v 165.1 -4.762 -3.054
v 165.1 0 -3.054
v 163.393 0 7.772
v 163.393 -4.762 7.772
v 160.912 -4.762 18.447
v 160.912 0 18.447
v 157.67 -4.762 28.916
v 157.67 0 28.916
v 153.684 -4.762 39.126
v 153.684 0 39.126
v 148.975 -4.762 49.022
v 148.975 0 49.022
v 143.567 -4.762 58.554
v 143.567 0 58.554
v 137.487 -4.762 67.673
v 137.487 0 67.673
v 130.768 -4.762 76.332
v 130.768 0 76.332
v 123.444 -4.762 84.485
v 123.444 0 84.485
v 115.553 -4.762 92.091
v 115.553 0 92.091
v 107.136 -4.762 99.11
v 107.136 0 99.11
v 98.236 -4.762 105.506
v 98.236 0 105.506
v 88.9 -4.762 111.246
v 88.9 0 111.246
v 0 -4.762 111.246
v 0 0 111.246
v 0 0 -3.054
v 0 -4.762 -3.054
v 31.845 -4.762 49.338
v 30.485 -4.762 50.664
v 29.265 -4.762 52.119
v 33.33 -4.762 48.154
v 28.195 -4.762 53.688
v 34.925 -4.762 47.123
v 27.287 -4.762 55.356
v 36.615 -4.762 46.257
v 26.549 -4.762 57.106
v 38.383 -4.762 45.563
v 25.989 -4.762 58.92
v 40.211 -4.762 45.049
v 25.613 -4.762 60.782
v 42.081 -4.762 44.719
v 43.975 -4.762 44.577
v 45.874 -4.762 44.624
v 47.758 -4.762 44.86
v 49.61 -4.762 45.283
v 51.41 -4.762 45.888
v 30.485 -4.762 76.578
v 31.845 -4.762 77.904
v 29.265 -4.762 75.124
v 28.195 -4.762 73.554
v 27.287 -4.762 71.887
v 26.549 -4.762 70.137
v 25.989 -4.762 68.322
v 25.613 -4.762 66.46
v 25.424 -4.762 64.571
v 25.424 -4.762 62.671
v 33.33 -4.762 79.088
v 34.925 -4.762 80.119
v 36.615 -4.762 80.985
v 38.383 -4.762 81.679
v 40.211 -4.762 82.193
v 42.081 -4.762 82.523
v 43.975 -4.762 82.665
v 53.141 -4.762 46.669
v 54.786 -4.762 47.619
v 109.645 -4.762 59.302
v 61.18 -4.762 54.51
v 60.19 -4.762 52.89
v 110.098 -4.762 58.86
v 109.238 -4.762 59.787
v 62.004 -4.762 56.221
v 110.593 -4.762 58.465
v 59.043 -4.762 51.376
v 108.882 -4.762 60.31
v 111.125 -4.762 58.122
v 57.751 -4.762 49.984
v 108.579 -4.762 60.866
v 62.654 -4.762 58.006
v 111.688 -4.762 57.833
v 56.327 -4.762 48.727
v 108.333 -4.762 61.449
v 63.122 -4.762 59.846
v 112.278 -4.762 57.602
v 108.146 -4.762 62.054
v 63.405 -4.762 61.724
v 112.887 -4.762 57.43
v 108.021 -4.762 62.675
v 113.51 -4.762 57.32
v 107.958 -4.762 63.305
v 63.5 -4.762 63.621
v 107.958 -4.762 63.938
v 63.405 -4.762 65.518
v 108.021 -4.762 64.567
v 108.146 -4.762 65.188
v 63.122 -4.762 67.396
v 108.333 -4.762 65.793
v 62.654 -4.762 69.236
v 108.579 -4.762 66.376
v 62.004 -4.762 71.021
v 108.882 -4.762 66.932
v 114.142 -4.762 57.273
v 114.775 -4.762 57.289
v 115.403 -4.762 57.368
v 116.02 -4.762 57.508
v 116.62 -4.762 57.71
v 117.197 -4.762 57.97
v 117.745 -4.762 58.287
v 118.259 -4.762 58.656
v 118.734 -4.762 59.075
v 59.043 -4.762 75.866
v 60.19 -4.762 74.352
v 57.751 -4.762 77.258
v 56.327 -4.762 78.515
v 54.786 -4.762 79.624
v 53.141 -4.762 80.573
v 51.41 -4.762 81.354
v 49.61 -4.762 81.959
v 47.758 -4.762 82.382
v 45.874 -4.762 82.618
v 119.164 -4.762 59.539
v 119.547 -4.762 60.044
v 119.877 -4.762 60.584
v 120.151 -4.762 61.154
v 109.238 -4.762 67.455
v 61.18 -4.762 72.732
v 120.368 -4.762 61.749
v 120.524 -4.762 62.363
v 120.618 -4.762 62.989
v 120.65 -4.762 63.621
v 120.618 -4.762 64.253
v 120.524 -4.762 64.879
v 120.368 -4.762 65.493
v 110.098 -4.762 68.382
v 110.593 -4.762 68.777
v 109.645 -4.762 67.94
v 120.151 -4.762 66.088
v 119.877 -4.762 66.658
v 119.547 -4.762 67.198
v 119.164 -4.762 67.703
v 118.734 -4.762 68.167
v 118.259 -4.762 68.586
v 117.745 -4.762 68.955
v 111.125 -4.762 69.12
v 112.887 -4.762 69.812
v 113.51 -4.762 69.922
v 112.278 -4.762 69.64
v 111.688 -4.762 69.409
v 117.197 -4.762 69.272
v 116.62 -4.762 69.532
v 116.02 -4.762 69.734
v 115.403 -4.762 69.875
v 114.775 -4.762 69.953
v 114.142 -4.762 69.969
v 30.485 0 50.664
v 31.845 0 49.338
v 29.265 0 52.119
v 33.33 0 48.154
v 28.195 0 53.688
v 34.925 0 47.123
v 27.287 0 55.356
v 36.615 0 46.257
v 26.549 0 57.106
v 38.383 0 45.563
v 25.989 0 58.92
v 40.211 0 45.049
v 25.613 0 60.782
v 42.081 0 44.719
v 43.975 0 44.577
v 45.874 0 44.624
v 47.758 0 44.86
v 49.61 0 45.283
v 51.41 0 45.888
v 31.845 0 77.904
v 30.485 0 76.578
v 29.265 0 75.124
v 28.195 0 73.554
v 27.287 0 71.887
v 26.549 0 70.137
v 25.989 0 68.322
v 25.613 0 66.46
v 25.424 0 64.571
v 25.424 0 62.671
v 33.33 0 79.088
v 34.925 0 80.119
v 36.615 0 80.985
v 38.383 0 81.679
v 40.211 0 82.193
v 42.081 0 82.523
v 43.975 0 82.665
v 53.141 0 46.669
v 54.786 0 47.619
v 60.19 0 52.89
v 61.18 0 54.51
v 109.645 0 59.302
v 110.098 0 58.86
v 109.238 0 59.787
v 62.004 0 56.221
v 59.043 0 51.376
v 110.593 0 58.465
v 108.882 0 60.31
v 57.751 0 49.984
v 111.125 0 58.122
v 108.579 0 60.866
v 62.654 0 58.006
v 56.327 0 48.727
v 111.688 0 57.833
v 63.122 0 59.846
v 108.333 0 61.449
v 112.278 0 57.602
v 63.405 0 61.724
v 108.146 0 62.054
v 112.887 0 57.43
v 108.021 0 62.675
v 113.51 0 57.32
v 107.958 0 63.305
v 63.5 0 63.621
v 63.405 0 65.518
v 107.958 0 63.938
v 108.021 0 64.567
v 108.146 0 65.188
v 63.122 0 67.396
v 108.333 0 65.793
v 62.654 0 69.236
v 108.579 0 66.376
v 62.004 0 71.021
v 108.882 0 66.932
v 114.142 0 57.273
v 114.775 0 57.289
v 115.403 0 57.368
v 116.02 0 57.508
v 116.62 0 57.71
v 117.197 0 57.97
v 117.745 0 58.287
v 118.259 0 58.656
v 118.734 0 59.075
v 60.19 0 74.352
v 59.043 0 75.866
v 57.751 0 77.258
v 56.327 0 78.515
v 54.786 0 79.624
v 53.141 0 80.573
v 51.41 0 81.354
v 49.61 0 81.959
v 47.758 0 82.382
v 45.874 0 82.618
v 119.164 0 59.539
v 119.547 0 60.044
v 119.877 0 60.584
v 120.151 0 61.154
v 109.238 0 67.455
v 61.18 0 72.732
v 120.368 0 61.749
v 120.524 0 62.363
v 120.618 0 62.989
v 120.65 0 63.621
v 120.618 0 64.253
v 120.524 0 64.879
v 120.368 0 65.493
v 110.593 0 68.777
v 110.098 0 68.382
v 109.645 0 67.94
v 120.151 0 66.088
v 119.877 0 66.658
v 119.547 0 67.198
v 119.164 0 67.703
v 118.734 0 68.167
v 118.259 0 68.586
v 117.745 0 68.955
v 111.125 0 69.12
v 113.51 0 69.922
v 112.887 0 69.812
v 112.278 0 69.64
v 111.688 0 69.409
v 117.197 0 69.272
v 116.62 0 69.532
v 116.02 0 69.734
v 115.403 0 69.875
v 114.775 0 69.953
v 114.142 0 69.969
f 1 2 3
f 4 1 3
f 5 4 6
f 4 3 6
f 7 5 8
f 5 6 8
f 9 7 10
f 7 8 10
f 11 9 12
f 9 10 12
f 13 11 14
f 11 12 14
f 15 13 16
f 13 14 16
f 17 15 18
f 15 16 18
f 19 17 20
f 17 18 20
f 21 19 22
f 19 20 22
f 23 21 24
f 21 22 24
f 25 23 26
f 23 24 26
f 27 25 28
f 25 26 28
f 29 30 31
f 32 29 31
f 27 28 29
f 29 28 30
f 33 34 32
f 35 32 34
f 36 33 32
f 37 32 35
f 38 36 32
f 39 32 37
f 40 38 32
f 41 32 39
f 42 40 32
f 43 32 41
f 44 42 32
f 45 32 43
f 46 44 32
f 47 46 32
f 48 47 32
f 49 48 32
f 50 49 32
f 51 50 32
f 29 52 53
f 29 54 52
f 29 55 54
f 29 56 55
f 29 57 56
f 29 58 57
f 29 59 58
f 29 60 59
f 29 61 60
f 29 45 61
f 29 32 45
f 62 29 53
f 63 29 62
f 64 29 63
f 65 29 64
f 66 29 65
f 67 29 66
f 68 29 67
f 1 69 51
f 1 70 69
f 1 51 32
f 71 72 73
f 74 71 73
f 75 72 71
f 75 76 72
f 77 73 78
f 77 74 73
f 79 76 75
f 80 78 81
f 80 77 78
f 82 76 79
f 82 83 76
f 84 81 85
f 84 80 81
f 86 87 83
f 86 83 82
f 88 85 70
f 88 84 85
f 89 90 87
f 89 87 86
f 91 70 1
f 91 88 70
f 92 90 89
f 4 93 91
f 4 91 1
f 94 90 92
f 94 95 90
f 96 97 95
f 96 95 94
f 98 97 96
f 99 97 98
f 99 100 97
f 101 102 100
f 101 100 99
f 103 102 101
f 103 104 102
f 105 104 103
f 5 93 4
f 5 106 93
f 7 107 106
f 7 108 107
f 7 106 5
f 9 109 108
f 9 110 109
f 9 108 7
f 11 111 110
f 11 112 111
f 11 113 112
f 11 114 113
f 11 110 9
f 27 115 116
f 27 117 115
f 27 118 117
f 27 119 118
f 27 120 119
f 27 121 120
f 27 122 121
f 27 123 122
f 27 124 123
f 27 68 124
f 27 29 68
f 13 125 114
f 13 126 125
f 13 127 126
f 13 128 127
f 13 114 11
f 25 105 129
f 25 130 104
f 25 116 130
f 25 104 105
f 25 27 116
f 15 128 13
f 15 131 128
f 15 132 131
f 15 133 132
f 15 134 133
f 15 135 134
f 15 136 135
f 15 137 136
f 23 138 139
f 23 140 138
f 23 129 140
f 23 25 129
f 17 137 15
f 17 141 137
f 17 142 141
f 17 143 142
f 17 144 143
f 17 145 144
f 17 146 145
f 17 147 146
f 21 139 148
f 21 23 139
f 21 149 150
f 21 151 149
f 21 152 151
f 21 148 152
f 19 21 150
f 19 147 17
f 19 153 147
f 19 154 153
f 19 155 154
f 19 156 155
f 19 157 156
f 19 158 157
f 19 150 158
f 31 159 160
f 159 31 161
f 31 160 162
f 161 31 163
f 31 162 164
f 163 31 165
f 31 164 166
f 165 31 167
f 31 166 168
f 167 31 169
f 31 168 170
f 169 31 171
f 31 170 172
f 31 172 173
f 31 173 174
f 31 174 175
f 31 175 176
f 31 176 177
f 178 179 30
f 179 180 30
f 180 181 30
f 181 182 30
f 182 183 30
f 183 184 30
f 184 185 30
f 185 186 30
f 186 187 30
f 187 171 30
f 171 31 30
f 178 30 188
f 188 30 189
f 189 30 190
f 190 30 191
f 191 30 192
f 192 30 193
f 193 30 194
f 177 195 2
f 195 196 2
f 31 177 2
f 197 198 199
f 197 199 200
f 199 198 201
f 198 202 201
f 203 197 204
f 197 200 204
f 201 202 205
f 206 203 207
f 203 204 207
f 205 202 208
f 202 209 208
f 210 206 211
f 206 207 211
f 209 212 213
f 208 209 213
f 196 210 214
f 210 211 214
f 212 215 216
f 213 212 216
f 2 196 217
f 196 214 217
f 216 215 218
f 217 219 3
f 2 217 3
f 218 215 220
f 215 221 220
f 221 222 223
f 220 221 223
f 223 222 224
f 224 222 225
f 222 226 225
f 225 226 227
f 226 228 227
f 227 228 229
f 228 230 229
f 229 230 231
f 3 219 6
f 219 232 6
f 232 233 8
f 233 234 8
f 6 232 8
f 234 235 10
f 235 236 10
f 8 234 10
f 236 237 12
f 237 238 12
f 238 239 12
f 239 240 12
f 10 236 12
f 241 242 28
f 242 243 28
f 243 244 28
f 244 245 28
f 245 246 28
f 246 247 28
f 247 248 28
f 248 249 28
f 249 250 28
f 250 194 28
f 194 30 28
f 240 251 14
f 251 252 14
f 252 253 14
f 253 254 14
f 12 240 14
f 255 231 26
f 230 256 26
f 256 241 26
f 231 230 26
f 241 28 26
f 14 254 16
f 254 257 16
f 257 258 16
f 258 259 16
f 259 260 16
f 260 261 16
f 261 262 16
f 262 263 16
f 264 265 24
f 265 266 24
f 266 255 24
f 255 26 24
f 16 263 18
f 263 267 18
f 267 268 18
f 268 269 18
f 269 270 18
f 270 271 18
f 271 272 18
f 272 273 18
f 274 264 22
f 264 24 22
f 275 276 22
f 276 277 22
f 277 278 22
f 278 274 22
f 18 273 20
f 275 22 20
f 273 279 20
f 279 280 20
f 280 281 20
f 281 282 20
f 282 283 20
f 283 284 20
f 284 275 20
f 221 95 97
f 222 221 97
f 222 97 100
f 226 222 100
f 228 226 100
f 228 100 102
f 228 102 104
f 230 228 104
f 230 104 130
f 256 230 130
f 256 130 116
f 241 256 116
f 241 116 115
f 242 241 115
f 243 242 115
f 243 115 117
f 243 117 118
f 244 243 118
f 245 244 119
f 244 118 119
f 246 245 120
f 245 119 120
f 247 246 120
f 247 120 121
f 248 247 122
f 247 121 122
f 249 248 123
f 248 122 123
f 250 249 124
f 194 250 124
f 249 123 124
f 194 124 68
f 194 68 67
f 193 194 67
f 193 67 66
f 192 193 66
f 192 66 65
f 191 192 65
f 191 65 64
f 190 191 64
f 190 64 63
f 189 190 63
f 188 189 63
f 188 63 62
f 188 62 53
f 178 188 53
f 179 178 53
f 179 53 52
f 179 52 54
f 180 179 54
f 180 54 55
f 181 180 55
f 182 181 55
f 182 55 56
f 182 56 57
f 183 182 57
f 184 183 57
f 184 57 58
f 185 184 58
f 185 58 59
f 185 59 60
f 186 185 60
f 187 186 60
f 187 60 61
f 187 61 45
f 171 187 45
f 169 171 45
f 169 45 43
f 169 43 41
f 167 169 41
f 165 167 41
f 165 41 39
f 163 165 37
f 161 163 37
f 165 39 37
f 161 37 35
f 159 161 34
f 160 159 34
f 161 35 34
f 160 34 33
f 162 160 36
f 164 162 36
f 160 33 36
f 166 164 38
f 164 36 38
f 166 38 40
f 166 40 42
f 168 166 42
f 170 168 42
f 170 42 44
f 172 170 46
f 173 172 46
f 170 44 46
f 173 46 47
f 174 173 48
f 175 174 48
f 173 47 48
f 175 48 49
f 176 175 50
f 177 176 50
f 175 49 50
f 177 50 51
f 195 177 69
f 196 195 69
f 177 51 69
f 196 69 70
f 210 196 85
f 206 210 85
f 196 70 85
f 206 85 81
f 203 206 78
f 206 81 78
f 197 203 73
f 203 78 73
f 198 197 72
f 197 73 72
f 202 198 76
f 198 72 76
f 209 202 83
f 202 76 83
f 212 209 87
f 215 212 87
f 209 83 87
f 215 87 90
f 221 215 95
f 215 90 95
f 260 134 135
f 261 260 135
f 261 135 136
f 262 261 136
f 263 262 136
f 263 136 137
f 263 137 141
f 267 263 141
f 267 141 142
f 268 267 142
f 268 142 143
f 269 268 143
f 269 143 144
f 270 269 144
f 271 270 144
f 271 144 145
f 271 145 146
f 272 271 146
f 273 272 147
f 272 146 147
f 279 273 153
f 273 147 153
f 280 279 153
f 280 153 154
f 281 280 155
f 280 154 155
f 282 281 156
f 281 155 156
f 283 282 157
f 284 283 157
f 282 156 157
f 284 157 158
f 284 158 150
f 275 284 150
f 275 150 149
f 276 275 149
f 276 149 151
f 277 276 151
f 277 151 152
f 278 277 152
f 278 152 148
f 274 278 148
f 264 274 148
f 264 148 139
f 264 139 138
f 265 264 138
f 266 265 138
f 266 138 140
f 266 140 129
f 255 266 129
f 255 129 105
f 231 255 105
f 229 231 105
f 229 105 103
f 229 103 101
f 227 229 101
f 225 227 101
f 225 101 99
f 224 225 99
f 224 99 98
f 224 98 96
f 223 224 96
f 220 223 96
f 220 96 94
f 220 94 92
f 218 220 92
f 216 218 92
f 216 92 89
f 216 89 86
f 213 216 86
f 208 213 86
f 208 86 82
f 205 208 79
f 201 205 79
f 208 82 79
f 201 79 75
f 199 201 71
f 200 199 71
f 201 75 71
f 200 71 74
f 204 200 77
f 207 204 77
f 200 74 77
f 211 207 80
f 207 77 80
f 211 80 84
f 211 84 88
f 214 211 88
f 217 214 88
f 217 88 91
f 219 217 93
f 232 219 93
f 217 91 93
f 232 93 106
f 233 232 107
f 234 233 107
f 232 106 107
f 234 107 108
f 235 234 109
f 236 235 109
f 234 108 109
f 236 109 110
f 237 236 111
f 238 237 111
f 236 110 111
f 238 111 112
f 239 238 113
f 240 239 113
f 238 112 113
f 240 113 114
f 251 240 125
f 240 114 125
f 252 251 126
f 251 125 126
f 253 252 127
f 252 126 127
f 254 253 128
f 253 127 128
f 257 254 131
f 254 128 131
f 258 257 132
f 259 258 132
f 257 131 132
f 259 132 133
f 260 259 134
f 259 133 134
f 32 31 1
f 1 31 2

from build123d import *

# Parameters (mm, degrees)
F1_DEPTH = 4.7625
F2_R     = 19.05
F2_R_2   = 6.35
F3_DEPTH = 4.7635


with BuildPart() as f1:
    # F0 (on Front) → F1 (new body)
    with BuildSketch(Plane.XZ):
        with BuildLine():
            Line((0, 111.24605), (0, -3.05395))
            Line((0, -3.05395), (165.1, -3.05395))
            ThreePointArc((165.1, -3.05395), (140.608839, 63.168609), (88.9, 111.24605))
            Line((88.9, 111.24605), (0, 111.24605))
        make_face()
    extrude(amount=F1_DEPTH)

    # F2 (on face) → F3 (cut, through all)
    with BuildSketch(Plane.XZ.offset(4.7625)):
        with Locations((44.45, 63.62105)):
            Circle(F2_R)
        with Locations((114.3, 63.62105)):
            Circle(F2_R_2)
    extrude(amount=-F3_DEPTH, mode=Mode.SUBTRACT)


solid = f1.part
